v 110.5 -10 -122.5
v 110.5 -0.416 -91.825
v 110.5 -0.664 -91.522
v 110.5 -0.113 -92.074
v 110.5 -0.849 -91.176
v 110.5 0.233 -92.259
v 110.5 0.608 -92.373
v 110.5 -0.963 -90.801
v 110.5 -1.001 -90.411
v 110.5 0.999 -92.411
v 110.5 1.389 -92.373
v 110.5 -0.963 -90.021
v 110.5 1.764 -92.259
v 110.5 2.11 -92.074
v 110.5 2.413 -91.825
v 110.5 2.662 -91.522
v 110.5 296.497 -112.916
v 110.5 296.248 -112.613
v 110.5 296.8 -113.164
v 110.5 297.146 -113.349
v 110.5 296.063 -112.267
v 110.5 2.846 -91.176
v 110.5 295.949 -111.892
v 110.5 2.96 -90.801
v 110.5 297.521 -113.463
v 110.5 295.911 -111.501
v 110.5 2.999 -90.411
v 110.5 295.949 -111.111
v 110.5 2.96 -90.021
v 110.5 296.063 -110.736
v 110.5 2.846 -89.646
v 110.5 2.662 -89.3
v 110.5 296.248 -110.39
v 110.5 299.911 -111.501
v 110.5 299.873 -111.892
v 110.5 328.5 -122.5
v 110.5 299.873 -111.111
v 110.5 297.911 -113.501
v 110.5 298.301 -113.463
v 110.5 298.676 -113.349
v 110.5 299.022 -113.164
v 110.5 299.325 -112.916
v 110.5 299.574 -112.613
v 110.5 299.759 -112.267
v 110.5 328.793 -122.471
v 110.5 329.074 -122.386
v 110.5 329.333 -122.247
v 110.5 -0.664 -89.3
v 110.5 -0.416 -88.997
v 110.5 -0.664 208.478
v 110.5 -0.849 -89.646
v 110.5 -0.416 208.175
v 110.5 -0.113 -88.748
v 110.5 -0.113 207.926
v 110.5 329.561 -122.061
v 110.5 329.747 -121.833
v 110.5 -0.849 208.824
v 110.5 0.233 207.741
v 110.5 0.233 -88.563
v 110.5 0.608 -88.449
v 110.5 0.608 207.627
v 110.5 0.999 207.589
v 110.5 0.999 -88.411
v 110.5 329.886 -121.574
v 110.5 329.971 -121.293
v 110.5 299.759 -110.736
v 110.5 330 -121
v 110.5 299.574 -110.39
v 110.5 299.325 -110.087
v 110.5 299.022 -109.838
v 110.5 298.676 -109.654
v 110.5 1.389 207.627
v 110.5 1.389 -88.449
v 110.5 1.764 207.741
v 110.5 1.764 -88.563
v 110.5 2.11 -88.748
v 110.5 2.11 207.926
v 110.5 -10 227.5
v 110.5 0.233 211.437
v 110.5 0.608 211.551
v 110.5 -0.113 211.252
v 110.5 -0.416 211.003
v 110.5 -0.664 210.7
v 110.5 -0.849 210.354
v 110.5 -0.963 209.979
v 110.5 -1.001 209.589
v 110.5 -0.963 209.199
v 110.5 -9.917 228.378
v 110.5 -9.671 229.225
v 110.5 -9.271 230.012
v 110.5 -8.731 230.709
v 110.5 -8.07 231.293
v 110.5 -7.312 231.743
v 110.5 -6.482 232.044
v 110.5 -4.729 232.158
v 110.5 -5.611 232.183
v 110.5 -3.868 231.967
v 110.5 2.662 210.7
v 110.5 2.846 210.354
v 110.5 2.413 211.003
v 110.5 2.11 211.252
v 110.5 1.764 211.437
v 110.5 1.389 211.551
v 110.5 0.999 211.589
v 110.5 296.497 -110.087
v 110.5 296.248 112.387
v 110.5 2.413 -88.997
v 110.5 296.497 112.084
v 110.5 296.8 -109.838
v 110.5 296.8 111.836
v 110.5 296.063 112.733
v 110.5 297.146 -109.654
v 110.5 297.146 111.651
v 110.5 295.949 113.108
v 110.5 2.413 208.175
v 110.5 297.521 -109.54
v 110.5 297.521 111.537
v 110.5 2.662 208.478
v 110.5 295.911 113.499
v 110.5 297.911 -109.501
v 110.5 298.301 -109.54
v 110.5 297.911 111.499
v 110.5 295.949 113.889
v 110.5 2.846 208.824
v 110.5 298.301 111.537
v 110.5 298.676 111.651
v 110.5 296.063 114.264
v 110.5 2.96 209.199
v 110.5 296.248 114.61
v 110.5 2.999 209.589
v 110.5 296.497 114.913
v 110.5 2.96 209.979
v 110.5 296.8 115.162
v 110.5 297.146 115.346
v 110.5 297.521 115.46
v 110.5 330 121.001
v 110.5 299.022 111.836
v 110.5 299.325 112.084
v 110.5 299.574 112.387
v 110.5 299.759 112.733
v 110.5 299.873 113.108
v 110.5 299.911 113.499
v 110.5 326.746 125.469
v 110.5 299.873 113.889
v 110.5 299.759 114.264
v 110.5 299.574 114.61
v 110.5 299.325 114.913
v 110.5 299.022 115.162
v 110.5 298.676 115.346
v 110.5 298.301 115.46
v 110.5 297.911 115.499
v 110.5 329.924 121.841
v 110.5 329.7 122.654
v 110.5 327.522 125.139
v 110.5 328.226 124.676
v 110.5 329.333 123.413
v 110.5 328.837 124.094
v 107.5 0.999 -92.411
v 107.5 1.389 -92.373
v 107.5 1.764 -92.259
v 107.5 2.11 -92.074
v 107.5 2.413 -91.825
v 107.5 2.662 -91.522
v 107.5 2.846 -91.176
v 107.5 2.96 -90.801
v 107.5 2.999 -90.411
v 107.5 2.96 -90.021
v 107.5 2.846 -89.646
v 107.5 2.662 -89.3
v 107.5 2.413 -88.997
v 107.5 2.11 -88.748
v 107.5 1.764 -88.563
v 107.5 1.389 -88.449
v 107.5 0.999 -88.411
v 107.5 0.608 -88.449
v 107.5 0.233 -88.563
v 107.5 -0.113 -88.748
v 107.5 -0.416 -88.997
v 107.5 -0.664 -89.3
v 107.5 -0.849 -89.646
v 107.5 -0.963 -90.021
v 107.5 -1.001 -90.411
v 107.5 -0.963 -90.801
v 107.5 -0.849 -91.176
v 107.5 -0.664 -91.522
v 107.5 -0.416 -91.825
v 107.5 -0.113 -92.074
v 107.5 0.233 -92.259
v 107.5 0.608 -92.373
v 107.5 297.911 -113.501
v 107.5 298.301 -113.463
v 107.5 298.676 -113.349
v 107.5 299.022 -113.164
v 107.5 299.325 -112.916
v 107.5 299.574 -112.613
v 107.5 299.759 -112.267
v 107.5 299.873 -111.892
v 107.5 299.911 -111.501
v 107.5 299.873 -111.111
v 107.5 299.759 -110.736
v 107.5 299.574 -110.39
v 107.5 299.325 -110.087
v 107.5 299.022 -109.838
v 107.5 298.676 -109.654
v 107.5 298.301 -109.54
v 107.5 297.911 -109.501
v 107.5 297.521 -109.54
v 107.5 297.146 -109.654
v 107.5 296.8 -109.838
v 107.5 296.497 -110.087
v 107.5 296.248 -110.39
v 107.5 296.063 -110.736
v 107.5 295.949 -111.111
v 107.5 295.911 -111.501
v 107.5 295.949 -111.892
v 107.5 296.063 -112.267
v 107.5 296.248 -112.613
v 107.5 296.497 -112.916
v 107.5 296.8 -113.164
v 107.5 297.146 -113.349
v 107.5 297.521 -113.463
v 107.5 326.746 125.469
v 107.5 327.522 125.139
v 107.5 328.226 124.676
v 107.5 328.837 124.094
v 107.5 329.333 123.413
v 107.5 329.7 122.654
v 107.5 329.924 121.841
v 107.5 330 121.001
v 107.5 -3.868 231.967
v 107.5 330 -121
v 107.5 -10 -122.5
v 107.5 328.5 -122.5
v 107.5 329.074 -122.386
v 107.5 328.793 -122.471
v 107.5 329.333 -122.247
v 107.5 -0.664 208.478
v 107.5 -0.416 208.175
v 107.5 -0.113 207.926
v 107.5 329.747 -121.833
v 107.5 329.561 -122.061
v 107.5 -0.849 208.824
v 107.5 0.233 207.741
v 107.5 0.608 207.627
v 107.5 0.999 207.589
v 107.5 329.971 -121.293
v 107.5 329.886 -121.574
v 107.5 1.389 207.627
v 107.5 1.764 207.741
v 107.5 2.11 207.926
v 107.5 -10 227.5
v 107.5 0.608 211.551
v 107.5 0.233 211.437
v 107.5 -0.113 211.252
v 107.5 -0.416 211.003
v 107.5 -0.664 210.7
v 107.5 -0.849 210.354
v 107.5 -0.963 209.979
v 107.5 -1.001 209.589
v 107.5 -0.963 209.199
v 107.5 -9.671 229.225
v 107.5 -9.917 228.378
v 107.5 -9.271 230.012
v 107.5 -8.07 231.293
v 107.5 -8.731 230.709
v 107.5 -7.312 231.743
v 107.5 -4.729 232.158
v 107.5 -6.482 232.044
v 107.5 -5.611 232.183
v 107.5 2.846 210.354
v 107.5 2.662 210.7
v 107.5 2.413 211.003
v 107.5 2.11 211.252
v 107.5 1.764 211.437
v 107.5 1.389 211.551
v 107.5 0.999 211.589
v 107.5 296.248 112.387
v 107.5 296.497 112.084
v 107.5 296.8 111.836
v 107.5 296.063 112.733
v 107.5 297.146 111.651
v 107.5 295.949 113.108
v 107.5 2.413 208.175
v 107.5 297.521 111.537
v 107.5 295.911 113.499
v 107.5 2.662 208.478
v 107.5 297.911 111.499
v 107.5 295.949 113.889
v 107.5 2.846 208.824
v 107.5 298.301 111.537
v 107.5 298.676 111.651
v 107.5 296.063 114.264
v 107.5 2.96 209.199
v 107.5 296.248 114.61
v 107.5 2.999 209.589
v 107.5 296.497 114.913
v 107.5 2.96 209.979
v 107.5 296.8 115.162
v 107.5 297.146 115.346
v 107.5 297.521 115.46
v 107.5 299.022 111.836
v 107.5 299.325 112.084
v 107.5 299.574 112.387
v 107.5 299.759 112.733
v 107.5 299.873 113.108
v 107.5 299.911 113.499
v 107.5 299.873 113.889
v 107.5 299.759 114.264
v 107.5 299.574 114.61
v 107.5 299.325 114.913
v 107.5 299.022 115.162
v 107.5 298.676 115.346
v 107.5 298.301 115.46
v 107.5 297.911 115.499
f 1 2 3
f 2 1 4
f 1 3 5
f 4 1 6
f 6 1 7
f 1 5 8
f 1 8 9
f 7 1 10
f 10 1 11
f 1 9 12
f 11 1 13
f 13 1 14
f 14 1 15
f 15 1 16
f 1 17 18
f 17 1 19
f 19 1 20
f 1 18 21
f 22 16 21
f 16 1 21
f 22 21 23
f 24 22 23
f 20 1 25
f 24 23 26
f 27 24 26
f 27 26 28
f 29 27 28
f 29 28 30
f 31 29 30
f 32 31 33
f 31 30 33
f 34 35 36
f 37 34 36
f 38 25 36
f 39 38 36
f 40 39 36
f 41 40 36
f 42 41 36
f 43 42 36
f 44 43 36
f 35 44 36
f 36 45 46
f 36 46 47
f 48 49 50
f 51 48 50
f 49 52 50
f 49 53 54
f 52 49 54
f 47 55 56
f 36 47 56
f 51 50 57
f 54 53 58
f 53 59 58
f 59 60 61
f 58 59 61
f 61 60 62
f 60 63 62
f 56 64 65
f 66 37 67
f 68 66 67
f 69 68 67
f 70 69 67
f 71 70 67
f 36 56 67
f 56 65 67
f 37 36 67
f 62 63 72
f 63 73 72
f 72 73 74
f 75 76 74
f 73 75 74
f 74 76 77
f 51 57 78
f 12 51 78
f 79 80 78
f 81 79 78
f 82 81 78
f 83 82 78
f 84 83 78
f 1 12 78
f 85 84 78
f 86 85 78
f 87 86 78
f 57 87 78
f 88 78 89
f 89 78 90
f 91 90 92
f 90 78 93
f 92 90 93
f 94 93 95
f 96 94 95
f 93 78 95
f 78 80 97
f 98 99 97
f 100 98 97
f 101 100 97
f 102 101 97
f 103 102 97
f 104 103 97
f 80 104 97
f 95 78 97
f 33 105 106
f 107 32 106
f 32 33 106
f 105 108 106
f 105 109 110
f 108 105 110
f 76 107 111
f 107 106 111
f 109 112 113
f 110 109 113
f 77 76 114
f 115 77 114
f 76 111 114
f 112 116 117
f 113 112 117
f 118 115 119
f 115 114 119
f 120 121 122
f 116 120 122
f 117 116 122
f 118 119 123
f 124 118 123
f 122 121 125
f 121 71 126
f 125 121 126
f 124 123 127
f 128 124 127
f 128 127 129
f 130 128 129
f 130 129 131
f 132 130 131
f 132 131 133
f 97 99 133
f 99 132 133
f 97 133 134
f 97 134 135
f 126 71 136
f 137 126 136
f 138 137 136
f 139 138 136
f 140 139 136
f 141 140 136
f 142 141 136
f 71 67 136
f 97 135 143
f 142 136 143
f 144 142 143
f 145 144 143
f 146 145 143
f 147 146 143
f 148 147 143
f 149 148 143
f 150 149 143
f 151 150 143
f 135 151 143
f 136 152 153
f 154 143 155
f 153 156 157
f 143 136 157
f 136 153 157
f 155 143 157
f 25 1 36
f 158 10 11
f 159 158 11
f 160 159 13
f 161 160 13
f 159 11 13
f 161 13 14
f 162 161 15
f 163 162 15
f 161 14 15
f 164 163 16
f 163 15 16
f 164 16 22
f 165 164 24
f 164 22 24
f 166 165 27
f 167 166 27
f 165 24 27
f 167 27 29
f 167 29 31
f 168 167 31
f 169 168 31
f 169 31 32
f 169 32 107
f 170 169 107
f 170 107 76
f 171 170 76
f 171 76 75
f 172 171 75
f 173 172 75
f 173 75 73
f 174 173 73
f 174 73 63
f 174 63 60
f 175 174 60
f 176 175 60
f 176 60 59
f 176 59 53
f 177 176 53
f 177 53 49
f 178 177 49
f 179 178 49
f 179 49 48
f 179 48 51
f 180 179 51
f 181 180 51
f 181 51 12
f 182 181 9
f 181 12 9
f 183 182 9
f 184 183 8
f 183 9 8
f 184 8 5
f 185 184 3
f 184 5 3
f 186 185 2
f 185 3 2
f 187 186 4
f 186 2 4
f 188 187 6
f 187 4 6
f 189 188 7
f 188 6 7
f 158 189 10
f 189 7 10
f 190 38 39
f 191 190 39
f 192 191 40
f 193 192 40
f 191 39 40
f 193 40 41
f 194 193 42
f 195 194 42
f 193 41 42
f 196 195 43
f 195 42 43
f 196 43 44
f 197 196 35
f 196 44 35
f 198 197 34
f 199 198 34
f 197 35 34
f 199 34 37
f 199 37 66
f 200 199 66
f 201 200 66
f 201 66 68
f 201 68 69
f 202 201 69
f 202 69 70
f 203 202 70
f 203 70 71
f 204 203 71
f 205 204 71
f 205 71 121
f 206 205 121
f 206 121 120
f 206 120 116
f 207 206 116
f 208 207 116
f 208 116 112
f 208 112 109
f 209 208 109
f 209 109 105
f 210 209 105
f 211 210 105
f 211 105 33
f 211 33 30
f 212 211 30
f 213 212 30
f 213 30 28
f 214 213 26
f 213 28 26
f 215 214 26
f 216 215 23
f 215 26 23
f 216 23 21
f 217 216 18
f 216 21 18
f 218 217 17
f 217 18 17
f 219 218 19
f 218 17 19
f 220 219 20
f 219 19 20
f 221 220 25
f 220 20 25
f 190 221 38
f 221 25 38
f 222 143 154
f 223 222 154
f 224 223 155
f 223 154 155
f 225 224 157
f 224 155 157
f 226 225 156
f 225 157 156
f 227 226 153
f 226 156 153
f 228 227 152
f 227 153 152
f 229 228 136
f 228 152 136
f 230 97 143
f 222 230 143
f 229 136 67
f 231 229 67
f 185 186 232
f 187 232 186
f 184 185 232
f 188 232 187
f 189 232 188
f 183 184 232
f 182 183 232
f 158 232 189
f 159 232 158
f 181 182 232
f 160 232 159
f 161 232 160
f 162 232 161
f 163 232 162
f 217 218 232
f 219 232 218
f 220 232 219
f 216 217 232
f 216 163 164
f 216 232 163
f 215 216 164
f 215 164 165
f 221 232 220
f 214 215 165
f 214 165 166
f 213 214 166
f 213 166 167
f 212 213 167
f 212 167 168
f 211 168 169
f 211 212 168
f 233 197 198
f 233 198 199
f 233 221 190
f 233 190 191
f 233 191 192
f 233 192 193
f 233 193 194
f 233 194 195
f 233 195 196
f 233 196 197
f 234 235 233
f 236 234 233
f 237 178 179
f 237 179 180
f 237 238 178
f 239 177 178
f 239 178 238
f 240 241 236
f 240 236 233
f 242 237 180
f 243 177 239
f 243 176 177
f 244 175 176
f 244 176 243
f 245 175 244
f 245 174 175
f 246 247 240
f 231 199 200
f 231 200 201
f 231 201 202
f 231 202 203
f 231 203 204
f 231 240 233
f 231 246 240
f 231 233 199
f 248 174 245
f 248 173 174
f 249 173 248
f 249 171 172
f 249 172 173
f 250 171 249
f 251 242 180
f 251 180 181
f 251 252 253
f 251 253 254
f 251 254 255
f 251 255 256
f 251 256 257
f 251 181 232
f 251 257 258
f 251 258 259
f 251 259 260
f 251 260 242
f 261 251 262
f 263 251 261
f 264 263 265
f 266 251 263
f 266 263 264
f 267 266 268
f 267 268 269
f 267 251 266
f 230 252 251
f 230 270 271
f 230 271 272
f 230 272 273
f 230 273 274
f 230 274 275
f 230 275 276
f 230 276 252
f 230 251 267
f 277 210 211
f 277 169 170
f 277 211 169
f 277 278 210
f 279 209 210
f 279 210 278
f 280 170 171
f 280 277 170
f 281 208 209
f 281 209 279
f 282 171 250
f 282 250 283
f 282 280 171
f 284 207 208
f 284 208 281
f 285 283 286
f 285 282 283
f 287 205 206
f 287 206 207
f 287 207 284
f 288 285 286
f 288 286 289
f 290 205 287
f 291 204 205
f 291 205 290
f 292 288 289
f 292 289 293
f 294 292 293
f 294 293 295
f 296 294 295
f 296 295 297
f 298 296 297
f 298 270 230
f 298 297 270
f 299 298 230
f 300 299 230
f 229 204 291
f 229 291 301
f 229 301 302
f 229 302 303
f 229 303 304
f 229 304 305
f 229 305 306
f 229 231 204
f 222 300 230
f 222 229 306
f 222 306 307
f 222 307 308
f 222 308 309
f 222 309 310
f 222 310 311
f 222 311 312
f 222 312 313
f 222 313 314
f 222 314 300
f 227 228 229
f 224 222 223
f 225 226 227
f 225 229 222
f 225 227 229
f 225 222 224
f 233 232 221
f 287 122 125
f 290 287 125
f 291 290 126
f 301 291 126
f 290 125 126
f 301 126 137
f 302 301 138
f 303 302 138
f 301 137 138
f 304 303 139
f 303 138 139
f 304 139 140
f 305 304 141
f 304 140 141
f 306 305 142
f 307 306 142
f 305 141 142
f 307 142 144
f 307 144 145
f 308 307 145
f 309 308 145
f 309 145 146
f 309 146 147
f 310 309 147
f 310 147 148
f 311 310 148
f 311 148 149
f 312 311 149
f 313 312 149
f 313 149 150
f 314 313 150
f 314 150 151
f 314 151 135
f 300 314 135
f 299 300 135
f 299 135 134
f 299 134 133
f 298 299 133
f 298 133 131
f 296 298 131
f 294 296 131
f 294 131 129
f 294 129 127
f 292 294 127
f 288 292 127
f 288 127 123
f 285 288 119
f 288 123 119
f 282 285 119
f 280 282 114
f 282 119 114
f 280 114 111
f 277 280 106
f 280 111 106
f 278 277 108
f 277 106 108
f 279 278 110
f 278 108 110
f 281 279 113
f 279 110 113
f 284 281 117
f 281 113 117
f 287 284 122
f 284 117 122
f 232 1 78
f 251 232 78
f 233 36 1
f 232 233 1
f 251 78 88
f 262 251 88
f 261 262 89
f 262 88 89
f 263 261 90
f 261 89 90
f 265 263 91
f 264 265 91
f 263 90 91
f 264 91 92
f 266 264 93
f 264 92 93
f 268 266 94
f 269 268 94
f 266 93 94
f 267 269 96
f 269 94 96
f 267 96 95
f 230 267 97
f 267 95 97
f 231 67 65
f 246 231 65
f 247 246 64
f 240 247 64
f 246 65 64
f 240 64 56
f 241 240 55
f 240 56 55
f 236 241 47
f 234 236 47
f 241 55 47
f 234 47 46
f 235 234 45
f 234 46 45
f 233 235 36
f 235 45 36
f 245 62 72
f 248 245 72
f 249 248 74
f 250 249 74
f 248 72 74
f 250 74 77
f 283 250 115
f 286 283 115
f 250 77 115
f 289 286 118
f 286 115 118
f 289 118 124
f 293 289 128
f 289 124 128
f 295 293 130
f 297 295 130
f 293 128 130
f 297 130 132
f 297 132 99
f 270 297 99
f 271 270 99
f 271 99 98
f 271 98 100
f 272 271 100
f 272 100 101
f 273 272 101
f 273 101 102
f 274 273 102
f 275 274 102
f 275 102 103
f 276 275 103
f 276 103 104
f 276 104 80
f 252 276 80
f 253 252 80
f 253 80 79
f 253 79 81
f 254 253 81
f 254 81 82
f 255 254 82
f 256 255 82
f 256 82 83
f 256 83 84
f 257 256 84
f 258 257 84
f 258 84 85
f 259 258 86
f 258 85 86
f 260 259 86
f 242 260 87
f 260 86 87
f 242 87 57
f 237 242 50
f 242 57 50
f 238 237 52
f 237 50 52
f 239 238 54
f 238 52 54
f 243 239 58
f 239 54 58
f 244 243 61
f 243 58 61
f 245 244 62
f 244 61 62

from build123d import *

# Parameters (mm, degrees)
BOSS_EXTRUDE1_DEPTH = 3
CUT_EXTRUDE2_REACH  = 5
SKETCH2_R           = 2


with BuildPart() as part:
    # Sketch1 → Boss-Extrude1 (new body)
    with BuildSketch(Plane(origin=(110.5, 0, 0), x_dir=(0, 0, -1), z_dir=(1, 0, 0))):
        with BuildLine():
            Line((122.5, 328.5), (122.5, -10))
            Line((122.5, -10), (-227.5, -10))
            ThreePointArc((-227.5, -10), (-231.293387843, -8.070194473), (-231.967157887, -3.867817213))
            Line((-231.967157887, -3.867817213), (-125.468557887, 326.745775479))
            ThreePointArc((-125.468557887, 326.745775479), (-123.764798126, 329.10018419), (-121.0014, 330))
            Line((-121.0014, 330), (121, 330))
            ThreePointArc((121, 330), (122.060660172, 329.560660172), (122.5, 328.5))
        make_face()
    extrude(amount=-BOSS_EXTRUDE1_DEPTH)

    # Sketch2 → Cut-Extrude2 (cut, up to next)
    with BuildSketch(Plane(origin=(110.5, 0, 0), x_dir=(0, 0, -1), z_dir=(1, 0, 0)), mode=Mode.PRIVATE) as cut_extrude2_sk1:
        with Locations((111.5014, 297.910969137)):
            Circle(SKETCH2_R)
    cut_extrude2_tool1 = extrude(cut_extrude2_sk1.sketch, amount=-CUT_EXTRUDE2_REACH, mode=Mode.PRIVATE) & part.part
    add(cut_extrude2_tool1.solids().sort_by_distance((110.5, 297.910969, -111.5014))[0], mode=Mode.SUBTRACT)
    # Sketch2 → Cut-Extrude2 (cut, up to next)
    with BuildSketch(Plane(origin=(110.5, 0, 0), x_dir=(0, 0, -1), z_dir=(1, 0, 0)), mode=Mode.PRIVATE) as cut_extrude2_sk2:
        with Locations((90.410969137, 0.9986)):
            Circle(SKETCH2_R)
    cut_extrude2_tool2 = extrude(cut_extrude2_sk2.sketch, amount=-CUT_EXTRUDE2_REACH, mode=Mode.PRIVATE) & part.part
    add(cut_extrude2_tool2.solids().sort_by_distance((110.5, 0.9986, -90.410969))[0], mode=Mode.SUBTRACT)
    # Sketch2 → Cut-Extrude2 (cut, up to next)
    with BuildSketch(Plane(origin=(110.5, 0, 0), x_dir=(0, 0, -1), z_dir=(1, 0, 0)), mode=Mode.PRIVATE) as cut_extrude2_sk3:
        with Locations((-209.589030863, 0.9986)):
            Circle(SKETCH2_R)
    cut_extrude2_tool3 = extrude(cut_extrude2_sk3.sketch, amount=-CUT_EXTRUDE2_REACH, mode=Mode.PRIVATE) & part.part
    add(cut_extrude2_tool3.solids().sort_by_distance((110.5, 0.9986, 209.589031))[0], mode=Mode.SUBTRACT)
    # Sketch2 → Cut-Extrude2 (cut, up to next)
    with BuildSketch(Plane(origin=(110.5, 0, 0), x_dir=(0, 0, -1), z_dir=(1, 0, 0)), mode=Mode.PRIVATE) as cut_extrude2_sk4:
        with Locations((-113.4986, 297.910969137)):
            Circle(SKETCH2_R)
    cut_extrude2_tool4 = extrude(cut_extrude2_sk4.sketch, amount=-CUT_EXTRUDE2_REACH, mode=Mode.PRIVATE) & part.part
    add(cut_extrude2_tool4.solids().sort_by_distance((110.5, 297.910969, 113.4986))[0], mode=Mode.SUBTRACT)


solid = part.part
